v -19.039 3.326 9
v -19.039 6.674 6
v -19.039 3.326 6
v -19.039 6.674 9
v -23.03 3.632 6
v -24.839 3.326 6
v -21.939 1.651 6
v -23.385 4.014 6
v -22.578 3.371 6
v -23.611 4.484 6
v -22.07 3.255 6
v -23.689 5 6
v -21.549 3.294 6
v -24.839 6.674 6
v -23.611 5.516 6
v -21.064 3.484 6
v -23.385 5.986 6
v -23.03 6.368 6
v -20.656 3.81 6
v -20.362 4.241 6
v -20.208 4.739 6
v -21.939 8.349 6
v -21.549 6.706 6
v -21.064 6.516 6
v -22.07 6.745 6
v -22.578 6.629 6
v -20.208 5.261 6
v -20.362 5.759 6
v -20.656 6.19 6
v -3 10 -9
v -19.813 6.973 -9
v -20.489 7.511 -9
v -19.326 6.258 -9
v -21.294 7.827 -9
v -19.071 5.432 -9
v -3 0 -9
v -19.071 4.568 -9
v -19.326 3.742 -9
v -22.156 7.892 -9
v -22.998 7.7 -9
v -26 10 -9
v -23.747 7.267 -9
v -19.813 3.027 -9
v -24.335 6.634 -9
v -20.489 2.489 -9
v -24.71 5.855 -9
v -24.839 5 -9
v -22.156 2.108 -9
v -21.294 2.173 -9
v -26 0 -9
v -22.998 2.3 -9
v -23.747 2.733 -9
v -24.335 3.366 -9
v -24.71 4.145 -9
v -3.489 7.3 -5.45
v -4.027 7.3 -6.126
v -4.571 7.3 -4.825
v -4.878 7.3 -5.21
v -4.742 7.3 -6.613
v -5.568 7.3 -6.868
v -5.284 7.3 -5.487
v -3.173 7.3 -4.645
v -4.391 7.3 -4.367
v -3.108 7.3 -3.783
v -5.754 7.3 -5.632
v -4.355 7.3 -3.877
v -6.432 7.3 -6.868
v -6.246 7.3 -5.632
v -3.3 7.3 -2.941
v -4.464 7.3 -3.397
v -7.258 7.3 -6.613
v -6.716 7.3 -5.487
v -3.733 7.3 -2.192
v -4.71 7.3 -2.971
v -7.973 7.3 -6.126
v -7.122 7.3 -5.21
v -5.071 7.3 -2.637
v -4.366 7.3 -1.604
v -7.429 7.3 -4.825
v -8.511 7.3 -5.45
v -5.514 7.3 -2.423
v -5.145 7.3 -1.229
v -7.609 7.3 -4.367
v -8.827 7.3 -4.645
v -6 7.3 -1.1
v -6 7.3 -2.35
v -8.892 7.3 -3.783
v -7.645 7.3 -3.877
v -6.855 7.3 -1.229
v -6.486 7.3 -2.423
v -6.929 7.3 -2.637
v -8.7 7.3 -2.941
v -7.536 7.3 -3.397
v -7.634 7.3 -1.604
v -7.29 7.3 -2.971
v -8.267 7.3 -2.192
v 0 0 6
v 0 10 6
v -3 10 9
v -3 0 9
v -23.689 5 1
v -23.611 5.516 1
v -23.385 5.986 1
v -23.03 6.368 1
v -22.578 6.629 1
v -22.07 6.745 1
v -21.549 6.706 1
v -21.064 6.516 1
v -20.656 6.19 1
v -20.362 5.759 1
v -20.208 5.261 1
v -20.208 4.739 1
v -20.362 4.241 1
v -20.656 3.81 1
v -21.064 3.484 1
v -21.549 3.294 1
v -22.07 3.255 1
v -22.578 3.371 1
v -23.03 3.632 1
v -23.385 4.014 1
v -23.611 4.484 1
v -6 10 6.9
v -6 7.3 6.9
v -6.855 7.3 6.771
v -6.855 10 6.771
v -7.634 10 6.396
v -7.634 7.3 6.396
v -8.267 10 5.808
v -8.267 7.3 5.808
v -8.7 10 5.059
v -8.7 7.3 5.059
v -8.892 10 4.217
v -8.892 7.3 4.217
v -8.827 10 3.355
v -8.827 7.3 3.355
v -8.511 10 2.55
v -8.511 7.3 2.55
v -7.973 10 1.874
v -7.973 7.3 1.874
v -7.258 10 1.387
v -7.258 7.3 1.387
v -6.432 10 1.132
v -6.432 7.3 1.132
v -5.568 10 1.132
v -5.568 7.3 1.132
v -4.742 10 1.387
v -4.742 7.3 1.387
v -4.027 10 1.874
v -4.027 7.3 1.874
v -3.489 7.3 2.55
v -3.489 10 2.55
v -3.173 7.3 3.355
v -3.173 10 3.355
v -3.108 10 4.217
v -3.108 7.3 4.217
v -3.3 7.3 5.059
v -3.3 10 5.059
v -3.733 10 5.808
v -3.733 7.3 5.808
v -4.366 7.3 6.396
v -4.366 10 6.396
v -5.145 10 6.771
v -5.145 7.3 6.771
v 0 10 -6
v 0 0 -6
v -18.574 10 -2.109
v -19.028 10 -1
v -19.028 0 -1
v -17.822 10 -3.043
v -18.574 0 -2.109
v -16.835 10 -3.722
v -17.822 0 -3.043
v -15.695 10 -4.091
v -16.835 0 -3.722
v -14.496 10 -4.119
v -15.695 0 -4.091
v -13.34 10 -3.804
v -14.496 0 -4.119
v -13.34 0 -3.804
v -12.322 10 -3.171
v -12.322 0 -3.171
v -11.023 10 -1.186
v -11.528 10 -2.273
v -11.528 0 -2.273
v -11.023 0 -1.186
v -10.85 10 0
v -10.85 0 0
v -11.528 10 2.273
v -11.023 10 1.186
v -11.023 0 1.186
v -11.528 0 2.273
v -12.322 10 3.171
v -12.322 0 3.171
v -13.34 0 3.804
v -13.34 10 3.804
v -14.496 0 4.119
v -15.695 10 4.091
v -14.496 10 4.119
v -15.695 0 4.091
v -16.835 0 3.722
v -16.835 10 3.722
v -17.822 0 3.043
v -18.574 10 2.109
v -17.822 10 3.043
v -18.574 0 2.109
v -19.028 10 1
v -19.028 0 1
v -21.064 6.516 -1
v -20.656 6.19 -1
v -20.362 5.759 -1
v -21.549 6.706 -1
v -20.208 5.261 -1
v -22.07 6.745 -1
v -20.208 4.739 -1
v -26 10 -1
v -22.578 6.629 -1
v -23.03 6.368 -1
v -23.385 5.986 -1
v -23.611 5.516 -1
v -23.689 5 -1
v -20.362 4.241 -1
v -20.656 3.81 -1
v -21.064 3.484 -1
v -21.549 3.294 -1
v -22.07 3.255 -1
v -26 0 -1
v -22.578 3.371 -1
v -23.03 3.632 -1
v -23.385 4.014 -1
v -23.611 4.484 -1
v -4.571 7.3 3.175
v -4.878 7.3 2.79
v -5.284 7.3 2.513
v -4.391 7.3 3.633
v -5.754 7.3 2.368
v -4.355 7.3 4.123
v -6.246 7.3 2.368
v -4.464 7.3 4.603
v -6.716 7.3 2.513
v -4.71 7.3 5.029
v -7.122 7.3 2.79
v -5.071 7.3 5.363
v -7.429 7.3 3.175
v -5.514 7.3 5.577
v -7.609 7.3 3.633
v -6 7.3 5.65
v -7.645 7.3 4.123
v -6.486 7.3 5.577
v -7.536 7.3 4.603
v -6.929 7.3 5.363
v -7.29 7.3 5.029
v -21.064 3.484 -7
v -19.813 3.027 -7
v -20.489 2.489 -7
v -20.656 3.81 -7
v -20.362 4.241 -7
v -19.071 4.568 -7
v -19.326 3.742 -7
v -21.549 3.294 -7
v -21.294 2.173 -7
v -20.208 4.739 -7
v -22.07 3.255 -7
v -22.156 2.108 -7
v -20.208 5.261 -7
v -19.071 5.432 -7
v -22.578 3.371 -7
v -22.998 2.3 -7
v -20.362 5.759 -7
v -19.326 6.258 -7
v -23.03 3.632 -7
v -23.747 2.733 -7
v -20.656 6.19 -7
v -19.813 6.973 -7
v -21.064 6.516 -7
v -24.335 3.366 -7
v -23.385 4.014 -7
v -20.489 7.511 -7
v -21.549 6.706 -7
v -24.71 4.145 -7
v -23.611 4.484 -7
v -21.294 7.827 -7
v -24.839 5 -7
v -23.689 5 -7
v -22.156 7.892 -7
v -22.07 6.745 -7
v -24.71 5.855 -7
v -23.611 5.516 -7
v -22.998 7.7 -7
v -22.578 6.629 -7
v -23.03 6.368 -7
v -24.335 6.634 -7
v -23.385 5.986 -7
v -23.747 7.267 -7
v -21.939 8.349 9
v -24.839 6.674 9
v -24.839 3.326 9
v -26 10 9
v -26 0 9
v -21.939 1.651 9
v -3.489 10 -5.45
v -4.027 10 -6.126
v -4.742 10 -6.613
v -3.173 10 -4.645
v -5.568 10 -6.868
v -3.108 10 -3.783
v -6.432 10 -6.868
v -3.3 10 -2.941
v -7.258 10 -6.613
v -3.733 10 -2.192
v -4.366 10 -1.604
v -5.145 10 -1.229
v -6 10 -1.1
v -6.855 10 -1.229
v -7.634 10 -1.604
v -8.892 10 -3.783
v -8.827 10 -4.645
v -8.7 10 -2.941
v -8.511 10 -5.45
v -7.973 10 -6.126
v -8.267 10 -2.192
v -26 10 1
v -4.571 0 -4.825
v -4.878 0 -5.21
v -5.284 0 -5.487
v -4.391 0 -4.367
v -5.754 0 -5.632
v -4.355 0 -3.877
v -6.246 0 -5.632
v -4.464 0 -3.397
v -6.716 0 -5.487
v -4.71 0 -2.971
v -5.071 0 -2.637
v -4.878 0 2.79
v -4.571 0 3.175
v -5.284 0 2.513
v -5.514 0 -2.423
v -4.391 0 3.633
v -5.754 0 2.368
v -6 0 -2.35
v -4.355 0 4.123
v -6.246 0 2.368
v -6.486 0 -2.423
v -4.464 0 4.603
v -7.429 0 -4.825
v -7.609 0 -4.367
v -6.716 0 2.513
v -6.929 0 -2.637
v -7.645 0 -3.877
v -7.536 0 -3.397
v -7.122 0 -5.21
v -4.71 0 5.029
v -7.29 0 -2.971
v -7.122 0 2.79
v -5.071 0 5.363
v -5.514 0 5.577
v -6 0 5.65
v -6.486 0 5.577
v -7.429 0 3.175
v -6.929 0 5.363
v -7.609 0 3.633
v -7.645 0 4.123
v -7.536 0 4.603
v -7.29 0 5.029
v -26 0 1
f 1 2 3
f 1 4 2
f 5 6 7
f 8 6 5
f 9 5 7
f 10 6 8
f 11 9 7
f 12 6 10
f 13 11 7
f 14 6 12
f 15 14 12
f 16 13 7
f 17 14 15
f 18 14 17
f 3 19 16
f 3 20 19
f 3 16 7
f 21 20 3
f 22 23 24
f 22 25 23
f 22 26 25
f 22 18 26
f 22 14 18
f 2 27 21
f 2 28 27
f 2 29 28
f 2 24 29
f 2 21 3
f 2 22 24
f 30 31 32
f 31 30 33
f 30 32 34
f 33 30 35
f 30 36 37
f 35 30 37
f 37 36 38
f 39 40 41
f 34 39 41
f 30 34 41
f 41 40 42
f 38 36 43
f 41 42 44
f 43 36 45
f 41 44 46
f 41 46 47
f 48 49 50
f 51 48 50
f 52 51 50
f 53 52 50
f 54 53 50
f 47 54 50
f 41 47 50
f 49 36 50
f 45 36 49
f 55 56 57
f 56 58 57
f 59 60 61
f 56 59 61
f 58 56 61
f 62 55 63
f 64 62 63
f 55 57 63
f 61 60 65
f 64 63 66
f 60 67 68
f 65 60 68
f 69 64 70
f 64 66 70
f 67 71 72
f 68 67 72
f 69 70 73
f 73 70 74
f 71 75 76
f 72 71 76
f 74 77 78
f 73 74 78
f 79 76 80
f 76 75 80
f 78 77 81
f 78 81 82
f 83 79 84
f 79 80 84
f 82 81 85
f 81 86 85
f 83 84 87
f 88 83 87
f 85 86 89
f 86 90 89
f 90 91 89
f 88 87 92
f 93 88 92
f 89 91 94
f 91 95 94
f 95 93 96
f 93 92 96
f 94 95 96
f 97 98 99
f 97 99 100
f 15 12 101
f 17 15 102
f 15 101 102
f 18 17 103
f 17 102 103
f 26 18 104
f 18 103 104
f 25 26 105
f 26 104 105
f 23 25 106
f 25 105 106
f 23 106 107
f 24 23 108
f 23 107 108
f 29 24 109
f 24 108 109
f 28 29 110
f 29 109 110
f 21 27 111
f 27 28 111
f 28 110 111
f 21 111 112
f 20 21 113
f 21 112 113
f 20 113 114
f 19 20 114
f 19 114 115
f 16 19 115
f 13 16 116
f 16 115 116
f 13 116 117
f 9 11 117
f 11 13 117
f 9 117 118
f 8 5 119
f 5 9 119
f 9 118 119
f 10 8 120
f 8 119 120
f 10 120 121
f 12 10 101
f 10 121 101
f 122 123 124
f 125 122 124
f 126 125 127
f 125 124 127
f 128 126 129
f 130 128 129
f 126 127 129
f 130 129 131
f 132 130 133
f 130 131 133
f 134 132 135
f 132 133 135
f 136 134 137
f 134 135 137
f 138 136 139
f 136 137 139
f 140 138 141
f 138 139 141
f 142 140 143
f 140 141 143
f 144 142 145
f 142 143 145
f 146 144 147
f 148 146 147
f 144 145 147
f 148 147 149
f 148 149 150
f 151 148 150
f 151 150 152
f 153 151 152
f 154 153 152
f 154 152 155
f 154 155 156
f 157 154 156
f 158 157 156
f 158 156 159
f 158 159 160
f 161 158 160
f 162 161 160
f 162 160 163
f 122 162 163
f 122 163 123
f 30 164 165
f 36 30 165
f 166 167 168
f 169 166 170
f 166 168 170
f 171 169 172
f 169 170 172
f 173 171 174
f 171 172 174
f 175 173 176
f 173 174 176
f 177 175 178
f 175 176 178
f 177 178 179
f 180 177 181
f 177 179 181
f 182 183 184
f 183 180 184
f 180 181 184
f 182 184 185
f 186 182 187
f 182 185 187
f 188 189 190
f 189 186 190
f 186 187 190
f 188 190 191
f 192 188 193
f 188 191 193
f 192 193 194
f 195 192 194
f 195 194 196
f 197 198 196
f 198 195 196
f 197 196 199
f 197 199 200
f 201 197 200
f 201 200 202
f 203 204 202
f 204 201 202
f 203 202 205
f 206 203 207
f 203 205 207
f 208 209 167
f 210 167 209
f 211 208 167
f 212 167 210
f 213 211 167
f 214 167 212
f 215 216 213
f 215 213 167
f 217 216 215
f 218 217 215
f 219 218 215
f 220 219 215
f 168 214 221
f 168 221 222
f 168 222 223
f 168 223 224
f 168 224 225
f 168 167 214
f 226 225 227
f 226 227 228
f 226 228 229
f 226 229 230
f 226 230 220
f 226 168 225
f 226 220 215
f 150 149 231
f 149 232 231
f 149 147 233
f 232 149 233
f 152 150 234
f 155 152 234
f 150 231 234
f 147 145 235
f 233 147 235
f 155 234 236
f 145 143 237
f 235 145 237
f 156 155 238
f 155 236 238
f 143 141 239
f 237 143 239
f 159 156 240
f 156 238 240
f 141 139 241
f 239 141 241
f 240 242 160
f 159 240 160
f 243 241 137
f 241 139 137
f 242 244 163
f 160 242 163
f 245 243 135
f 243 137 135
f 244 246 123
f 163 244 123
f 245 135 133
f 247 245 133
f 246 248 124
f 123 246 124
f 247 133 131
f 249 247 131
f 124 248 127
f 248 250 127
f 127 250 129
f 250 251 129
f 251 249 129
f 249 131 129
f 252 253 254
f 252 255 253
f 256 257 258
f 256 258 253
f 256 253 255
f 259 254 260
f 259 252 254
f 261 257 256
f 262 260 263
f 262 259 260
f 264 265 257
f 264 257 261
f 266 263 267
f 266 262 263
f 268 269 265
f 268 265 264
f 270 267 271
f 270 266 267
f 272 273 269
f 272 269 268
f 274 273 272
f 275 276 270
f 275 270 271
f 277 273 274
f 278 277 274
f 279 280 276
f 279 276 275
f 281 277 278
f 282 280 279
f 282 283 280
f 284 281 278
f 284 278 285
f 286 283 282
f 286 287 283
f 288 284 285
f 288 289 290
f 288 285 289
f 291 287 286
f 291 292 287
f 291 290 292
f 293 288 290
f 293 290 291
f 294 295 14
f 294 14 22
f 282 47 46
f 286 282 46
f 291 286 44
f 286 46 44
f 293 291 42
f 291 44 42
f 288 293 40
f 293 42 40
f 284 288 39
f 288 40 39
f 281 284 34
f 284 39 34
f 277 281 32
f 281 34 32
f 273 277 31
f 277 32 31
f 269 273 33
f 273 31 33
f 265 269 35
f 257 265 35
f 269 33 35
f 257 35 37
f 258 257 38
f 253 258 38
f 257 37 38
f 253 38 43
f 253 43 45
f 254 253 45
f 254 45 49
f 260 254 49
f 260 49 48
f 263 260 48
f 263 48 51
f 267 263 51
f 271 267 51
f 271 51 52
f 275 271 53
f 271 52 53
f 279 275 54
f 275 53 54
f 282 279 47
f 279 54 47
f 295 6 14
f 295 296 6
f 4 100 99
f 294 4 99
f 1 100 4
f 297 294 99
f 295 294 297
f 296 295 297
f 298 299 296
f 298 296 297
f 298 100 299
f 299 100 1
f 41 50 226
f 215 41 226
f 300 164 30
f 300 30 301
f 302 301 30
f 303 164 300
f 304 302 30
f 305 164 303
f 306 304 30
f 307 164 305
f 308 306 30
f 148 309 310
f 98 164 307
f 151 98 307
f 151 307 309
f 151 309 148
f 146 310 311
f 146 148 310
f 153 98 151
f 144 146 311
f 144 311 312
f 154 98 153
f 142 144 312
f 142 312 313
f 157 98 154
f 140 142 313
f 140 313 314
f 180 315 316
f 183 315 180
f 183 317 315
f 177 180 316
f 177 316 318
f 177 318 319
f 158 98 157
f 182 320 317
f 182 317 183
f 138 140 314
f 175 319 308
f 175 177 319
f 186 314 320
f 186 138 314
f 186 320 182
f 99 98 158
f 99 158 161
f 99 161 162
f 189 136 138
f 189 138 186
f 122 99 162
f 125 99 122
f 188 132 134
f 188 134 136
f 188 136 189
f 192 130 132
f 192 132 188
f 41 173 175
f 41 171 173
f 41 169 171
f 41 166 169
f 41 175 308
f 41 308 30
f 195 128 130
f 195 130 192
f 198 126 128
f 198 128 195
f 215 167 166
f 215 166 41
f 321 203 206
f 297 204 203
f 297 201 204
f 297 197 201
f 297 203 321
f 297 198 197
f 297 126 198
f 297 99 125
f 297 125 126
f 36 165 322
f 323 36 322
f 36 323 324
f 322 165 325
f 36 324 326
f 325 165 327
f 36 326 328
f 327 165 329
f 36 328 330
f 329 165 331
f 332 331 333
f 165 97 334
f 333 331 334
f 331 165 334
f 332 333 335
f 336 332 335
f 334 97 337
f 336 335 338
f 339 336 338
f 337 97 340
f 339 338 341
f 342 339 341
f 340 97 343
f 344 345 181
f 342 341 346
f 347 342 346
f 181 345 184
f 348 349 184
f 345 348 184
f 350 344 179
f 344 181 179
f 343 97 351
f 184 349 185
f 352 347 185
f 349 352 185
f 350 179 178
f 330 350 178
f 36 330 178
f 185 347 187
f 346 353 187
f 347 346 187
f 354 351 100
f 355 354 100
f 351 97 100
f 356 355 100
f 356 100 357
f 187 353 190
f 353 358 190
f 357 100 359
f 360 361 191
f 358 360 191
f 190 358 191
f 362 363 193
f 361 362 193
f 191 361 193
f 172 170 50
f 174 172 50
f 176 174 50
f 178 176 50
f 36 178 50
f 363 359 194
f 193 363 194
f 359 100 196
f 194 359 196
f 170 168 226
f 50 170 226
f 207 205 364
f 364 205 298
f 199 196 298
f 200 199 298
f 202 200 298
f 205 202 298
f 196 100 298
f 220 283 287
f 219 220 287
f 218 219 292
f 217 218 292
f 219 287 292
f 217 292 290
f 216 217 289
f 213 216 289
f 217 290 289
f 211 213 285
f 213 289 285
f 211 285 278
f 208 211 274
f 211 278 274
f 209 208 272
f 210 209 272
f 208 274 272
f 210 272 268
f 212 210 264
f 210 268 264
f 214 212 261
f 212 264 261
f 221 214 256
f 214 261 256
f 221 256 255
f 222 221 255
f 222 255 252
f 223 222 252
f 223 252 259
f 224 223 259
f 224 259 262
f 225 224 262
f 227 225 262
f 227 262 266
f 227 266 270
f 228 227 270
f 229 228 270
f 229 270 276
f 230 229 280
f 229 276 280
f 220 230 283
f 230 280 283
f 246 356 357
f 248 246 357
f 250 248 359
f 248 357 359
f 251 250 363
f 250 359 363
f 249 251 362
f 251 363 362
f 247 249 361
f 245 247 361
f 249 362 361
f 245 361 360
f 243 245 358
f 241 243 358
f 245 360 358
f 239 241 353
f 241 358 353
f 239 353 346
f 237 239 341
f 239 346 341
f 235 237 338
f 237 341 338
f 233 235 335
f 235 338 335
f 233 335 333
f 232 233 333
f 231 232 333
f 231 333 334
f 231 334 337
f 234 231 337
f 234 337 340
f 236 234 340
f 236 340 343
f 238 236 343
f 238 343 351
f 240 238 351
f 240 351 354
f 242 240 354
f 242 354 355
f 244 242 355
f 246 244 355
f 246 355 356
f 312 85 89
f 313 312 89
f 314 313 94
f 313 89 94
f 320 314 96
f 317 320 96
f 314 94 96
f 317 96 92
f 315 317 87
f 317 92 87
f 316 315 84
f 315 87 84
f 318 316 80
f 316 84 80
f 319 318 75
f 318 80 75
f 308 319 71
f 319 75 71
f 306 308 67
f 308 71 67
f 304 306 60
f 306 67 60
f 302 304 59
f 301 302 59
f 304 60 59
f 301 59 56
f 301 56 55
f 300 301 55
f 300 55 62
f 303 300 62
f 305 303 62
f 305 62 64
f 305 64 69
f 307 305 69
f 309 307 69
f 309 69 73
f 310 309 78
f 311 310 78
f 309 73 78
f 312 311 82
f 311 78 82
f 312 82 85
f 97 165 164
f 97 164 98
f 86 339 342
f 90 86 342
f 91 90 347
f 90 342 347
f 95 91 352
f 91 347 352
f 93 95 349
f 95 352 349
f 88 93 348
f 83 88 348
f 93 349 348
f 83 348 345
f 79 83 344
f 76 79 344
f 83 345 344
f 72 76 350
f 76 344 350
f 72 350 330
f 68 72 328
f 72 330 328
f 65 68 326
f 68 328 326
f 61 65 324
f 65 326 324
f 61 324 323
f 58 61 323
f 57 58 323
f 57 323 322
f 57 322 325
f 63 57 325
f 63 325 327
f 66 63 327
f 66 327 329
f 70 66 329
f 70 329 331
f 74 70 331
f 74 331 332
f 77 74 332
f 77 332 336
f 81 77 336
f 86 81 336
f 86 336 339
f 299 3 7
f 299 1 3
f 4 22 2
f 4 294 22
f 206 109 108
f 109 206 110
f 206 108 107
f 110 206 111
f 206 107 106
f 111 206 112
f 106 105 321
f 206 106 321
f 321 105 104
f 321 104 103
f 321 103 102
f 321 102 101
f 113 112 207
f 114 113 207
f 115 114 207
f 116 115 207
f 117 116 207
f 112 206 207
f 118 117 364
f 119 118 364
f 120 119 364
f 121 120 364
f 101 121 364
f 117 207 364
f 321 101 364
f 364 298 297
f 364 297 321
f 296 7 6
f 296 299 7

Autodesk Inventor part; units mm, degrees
ref_plane "YZ Plane" through (0, 0, 0) normal (1, 0, 0) x (0, 1, 0)
ref_plane "XZ Plane" through (0, 0, 0) normal (0, 1, 0) x (-1, 0, 0)
ref_plane "XY Plane" through (0, 0, 0) normal (0, 0, 1) x (1, 0, 0)
sketch "Sketch1" plane through (0, 0, 0) normal (0, 1, 0) x (-1, 0, 0)
  line L0 (10.85, 0) -> (0, 0)
  line L1 (0, -9) -> (26, -9)
  line L2 (26, -9) -> (26, -1)
  circle A0 centre (15, 0) radius 4.15
  line L3 (19.0277, -1) -> (26, -1)
  line L4 (0, 9) -> (26, 9)
  line L5 (26, 9) -> (26, 1)
  circle A1 centre (15, 0) radius 4.15
  line L6 (19.0277, 1) -> (26, 1)
  line L7 (0, -9) -> (0, 0)
  line L8 (0, 9) -> (0, 0)
  point P0 (19.0277, 1)
  dimension "d2" = 1
  dimension "d3" = 9
  dimension "d4" = 8.3
  dimension "d27" = 15
  dimension "d28" = 26
extrude "Extrusion1" add sketch "Sketch1" along normal blind 10 contours A0 L3 L2 L1 L7 L0 | L0 L8 L4 L5 L6 A0
sketch "Sketch7" plane through (0, 10, 0) normal (0, 1, 0) x (1, 0, 0)
  line L0 (0, -9) -> (0, 9) projected
  line L1 (-31.2, 0) -> (5.2, 0) projected
  arc A0 (-19.0277, -1) -> (-19.0277, 1) centre (-15, 0) ccw projected
  point P0 (0, 0)
  point P1 (-6, -4)
  point P2 (0, 0)
  point P3 (-6, 4)
  dimension "d44" = 8
  dimension "d45" = 9
hole "Hole1" at (-6, 10, 4) at (-6, 10, -4) direction (0, -1, 0) diameter 3.3 end through all counterbore diameter 5.8 counterbore depth 2.7
sketch "Sketch3" plane through (0, 0, -9) normal (0, 0, -1) x (-1, 0, 0)
  circle A0 centre (21.9389, 5) radius 1.75
  line L0 (26, 0) -> (26, 10) projected
  line L1 (10.85, 10) -> (19.0277, 10) projected
  point P0 (0, 0)
  point P1 (26, 5)
  point P2 (14.9389, 10)
  dimension "d15" = 3.5
  dimension "d46" = 7
extrude "Extrusion3" cut sketch "Sketch3" against normal up to surface (18 mm away)
sketch "Sketch4" plane through (-26, 0, 9) normal (0, 0, 1) x (1, 0, 0)
  line L0 (1.1611, 6.6743) -> (4.0611, 8.3486)
  line L1 (4.0611, 8.3486) -> (6.9611, 6.6743)
  line L2 (6.9611, 6.6743) -> (6.9611, 3.3257)
  line L3 (6.9611, 3.3257) -> (4.0611, 1.6514)
  line L4 (4.0611, 1.6514) -> (1.1611, 3.3257)
  line L5 (1.1611, 3.3257) -> (1.1611, 6.6743)
  circle A0 centre (4.0611, 5) radius 1.75 projected
  point P0 (26, 0)
  point P1 (1.1611, 5)
  dimension "d20" = 5.8
extrude "Extrusion4" cut sketch "Sketch4" against normal blind 3
sketch "Sketch5" plane through (0, 0, -9) normal (0, 0, -1) x (-1, 0, 0)
  circle A0 centre (21.9389, 5) radius 2.9
  circle A1 centre (21.9389, 5) radius 1.75 projected
  point P0 (0, 0)
  dimension "d23" = 5.8
extrude "Extrusion5" cut sketch "Sketch5" against normal blind 2
chamfer "Chamfer1" distance 3 angle 45 2 edges at (0, 5, 9) (0, 5, -9)
equation "\"d17\" = d15"
properties part number "Shaft support"
